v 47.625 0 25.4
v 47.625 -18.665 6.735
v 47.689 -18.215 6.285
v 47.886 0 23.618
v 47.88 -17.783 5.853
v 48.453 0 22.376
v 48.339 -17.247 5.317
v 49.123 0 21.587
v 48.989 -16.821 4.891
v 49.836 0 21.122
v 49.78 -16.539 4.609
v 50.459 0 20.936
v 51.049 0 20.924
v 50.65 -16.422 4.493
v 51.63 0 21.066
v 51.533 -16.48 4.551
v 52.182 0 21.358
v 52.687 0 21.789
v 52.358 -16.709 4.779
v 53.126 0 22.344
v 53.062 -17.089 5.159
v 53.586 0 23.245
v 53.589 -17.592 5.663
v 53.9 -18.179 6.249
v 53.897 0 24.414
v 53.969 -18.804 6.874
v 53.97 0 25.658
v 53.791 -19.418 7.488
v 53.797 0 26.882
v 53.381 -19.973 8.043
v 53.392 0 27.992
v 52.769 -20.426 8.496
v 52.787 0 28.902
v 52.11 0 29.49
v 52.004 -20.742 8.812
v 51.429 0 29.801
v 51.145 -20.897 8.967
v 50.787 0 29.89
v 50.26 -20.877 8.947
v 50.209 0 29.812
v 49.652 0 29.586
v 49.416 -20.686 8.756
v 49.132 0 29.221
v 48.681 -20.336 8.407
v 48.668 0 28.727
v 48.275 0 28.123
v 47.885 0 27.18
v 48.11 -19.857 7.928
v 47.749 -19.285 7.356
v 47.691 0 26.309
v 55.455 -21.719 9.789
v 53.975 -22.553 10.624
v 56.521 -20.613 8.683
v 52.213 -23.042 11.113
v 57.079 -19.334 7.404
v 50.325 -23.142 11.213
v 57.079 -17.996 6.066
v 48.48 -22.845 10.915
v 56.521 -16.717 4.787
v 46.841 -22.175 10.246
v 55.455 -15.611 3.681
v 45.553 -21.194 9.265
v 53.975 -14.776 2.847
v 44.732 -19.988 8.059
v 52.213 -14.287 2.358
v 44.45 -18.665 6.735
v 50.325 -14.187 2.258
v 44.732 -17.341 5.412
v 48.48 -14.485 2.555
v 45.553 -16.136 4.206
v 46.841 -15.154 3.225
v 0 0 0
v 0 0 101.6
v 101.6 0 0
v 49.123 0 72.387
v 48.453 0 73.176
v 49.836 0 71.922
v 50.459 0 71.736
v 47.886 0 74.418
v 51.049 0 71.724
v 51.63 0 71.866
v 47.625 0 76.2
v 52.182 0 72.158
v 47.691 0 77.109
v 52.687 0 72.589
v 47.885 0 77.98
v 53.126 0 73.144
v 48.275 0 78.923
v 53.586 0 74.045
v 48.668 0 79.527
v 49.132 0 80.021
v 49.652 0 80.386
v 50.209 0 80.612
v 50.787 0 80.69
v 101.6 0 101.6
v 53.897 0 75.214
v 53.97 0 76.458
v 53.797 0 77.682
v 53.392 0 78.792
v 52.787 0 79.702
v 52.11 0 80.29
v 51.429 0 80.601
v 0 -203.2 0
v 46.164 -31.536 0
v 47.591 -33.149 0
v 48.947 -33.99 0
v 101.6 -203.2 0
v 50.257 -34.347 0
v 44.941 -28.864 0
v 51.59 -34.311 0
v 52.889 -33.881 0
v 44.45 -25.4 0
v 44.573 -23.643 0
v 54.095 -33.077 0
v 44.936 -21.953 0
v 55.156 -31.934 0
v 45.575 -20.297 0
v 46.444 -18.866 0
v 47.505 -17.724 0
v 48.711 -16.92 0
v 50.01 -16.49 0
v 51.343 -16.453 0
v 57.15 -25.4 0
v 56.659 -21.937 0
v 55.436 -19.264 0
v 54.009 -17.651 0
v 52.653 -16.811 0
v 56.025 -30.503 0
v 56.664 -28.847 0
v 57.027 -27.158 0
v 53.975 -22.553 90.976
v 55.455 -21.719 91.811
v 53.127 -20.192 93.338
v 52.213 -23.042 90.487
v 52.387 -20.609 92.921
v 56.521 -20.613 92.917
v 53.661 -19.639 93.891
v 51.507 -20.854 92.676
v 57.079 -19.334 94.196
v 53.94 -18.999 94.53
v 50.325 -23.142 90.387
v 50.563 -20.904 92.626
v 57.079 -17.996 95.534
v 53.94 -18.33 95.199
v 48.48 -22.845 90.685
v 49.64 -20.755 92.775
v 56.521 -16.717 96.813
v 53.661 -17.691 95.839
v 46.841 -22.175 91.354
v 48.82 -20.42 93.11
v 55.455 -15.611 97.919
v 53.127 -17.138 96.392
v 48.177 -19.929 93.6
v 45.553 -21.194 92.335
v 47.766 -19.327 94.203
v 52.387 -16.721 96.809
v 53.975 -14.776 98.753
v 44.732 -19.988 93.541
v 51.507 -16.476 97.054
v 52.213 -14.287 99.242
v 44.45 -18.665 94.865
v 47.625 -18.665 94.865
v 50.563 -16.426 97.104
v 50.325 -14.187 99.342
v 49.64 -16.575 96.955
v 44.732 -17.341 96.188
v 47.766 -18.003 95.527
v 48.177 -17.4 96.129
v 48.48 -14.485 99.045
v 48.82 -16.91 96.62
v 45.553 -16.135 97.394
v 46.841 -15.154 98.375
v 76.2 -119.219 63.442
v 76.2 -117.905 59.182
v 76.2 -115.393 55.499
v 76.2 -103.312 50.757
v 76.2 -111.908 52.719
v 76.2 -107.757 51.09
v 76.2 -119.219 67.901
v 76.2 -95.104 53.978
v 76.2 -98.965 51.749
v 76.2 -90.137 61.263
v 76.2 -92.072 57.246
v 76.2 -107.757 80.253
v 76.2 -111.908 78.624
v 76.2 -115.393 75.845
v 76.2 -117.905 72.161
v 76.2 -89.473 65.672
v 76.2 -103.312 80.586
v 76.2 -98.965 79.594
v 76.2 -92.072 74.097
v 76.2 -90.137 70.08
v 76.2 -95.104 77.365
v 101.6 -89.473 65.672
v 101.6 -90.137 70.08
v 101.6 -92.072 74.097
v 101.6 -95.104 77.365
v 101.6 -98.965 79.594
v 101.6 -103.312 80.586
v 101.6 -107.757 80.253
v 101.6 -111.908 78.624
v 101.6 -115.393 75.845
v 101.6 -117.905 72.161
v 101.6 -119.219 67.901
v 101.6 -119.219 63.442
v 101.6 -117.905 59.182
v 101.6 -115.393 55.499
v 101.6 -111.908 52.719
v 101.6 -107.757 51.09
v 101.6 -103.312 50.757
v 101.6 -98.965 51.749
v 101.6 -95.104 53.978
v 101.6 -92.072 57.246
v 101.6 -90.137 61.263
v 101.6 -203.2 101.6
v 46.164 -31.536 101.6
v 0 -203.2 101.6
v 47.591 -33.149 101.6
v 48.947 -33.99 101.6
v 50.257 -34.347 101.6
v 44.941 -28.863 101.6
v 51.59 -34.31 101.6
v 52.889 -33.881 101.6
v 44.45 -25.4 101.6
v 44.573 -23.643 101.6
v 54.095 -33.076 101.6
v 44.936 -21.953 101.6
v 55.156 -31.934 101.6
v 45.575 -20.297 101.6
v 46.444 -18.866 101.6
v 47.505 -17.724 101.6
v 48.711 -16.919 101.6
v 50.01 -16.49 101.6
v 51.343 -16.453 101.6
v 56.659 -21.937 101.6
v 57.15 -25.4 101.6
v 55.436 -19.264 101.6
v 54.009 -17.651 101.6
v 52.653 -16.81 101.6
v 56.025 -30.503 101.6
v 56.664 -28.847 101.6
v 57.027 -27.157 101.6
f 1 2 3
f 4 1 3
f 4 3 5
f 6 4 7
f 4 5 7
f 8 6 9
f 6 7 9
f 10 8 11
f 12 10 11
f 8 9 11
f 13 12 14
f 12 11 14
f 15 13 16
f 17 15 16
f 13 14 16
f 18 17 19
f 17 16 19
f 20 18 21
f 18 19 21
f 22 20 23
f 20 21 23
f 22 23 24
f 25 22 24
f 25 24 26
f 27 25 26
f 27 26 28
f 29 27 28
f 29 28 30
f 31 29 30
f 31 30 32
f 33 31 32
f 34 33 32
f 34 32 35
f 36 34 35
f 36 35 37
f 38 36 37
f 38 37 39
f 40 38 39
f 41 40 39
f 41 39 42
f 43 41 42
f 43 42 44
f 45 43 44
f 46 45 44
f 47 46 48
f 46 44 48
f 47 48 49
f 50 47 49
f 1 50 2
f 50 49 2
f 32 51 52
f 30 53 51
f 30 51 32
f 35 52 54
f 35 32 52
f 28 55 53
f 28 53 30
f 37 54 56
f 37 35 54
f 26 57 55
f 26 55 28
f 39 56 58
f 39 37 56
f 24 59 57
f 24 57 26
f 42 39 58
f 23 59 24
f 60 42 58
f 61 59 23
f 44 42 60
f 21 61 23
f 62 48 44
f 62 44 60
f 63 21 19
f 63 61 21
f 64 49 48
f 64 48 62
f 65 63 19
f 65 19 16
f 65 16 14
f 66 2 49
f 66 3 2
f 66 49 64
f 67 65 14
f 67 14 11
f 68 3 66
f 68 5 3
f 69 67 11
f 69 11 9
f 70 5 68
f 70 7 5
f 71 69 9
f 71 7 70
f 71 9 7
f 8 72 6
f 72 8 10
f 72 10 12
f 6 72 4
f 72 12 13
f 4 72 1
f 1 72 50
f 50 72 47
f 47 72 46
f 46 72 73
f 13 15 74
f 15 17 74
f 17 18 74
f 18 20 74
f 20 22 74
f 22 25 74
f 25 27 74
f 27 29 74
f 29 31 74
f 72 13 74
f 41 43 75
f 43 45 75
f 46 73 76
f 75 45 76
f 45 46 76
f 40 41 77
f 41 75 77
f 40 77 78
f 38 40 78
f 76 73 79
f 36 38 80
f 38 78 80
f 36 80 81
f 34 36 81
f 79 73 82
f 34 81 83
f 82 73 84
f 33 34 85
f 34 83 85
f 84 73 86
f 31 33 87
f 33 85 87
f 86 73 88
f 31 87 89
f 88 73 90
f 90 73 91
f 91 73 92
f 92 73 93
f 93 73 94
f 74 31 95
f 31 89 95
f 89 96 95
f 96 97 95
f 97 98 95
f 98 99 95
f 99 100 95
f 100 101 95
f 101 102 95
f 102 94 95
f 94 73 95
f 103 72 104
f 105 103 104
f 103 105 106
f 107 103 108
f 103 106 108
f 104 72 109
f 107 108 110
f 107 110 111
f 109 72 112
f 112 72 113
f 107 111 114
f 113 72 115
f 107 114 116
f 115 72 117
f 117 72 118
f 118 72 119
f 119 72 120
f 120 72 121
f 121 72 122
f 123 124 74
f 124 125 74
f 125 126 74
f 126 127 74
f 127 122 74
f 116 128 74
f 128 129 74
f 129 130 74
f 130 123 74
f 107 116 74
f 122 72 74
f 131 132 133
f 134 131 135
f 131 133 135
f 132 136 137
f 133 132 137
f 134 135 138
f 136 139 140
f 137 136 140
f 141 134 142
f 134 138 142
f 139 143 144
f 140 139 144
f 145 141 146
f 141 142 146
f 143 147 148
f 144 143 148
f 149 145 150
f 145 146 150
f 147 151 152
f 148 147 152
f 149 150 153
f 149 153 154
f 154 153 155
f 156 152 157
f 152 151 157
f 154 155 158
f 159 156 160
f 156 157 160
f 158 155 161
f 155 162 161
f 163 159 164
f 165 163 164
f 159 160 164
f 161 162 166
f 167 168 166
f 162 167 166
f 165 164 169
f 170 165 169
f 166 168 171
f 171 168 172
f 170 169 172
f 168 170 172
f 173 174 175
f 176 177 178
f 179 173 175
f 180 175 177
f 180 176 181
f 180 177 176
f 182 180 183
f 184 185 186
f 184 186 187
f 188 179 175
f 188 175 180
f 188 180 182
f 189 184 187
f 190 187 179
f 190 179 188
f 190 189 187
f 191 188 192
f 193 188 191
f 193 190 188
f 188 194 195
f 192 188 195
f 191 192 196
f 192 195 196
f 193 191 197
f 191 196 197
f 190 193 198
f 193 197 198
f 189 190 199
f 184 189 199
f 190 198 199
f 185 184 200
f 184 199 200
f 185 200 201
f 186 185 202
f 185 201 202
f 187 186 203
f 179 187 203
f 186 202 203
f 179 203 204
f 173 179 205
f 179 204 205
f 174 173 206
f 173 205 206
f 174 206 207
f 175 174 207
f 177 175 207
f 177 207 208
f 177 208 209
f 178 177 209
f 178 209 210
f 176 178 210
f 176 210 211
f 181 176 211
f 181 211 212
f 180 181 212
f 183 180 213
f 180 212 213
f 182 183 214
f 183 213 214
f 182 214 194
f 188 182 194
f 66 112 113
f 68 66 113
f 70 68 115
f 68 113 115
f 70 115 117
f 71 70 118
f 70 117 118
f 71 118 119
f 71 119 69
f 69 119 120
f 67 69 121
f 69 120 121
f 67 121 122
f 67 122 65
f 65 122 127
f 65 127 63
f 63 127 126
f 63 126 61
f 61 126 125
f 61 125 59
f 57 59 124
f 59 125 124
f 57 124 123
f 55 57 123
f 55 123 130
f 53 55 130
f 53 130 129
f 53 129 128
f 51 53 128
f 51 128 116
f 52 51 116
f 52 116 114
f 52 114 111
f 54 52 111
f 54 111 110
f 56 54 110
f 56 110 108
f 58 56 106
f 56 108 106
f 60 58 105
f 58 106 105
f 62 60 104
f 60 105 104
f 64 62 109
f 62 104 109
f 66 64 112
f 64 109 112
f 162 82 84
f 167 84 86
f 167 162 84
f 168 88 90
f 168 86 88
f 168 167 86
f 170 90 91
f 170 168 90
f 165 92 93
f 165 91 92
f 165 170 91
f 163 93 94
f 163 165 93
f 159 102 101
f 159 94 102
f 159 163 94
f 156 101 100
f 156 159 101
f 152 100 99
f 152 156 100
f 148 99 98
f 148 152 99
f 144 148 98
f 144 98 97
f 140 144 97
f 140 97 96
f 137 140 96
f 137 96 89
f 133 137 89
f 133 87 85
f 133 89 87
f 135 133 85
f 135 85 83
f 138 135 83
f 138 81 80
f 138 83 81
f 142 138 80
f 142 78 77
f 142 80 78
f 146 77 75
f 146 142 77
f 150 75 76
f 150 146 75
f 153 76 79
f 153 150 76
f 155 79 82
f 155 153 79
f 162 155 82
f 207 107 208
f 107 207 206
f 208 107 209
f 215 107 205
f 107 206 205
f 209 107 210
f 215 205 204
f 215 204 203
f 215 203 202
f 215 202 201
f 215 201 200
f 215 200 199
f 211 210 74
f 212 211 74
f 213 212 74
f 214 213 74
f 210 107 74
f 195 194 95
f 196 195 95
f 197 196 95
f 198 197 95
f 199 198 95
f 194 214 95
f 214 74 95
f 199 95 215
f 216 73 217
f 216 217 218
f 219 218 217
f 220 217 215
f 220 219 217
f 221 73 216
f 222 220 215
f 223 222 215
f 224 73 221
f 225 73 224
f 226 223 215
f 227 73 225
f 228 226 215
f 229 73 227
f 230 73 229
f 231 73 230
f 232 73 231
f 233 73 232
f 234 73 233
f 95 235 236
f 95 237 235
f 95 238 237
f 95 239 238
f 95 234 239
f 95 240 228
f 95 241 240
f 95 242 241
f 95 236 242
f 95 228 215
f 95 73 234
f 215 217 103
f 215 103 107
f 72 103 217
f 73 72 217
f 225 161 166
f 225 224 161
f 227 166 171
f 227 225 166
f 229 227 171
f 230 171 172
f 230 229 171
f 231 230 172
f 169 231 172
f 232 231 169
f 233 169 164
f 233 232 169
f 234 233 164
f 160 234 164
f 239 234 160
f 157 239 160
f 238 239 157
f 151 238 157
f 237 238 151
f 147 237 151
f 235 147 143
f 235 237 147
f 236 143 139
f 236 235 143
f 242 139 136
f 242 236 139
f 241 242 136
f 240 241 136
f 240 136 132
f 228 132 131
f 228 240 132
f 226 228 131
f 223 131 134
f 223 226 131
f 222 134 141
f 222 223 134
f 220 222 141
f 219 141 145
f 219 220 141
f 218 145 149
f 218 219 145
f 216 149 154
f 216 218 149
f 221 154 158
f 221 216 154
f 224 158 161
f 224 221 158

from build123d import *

# Parameters (mm, degrees)
F0_W          = 101.6
F0_H          = 101.6
F1_DEPTH      = 203.2
F4_R          = 3.175
F5_DEPTH      = 89.8035612107
F4_R_2        = 6.35
F6_DEPTH      = 9.525
F6_DEPTH_BACK = 125.724585695
F8_R          = 14.9564756193
F9_DEPTH      = 25.4


# Not quite as in the source:
# - a pattern or mirror of a feature is missing from the dataset's text; its kind, count and spacing are read off the source's solid


with BuildPart() as f1:
    # F0 (on Front) → F1 (new body)
    with BuildSketch(Plane.XZ):
        with Locations((50.8, 50.8)):
            Rectangle(F0_W, F0_H)
    extrude(amount=F1_DEPTH)

    # F4 (on line) → F5 (cut, through all)
    with BuildSketch(Plane(origin=(0, -63.5, 63.5), x_dir=(-1, 0, 0), z_dir=(0, 0.7071067812, -0.7071067812))):
        with Locations((-50.8, 53.8815367264)):
            Circle(F4_R)
    f5 = extrude(amount=F5_DEPTH, mode=Mode.SUBTRACT)

    # F5_copies: F5 across plane
    add(f5.mirror(Plane(origin=(0, 1.2e-05, 50.799992), x_dir=(-1, 0, 0), z_dir=(0, 0, -1))), mode=Mode.SUBTRACT)

    # F4 (on line) → F6 (cut, two sides)
    with BuildSketch(Plane(origin=(0, -63.5, 63.5), x_dir=(-1, 0, 0), z_dir=(0, 0.7071067812, -0.7071067812))) as f6_sk:
        with Locations((-50.8, 53.8815367264)):
            Circle(F4_R_2)
        with Locations((-50.8, 53.8815367264)):
            Circle(F4_R, mode=Mode.SUBTRACT)
        with Locations((-50.8, 53.8815367264)):
            Circle(F4_R)
    f6 = extrude(amount=F6_DEPTH, mode=Mode.SUBTRACT) + extrude(f6_sk.sketch, amount=-F6_DEPTH_BACK, mode=Mode.SUBTRACT)

    # F6_copies: F6 across plane
    add(f6.mirror(Plane(origin=(0, 2.8e-05, 50.79997), x_dir=(0, -1, 1e-06), z_dir=(0, -1e-06, -1))), mode=Mode.SUBTRACT)

    # F8 (on face) → F9 (cut)
    with BuildSketch(Plane.YZ.offset(101.6)):
        with Locations((-104.4293493032, 65.6716227531)):
            Circle(F8_R)
    extrude(amount=-F9_DEPTH, mode=Mode.SUBTRACT)


solid = f1.part
